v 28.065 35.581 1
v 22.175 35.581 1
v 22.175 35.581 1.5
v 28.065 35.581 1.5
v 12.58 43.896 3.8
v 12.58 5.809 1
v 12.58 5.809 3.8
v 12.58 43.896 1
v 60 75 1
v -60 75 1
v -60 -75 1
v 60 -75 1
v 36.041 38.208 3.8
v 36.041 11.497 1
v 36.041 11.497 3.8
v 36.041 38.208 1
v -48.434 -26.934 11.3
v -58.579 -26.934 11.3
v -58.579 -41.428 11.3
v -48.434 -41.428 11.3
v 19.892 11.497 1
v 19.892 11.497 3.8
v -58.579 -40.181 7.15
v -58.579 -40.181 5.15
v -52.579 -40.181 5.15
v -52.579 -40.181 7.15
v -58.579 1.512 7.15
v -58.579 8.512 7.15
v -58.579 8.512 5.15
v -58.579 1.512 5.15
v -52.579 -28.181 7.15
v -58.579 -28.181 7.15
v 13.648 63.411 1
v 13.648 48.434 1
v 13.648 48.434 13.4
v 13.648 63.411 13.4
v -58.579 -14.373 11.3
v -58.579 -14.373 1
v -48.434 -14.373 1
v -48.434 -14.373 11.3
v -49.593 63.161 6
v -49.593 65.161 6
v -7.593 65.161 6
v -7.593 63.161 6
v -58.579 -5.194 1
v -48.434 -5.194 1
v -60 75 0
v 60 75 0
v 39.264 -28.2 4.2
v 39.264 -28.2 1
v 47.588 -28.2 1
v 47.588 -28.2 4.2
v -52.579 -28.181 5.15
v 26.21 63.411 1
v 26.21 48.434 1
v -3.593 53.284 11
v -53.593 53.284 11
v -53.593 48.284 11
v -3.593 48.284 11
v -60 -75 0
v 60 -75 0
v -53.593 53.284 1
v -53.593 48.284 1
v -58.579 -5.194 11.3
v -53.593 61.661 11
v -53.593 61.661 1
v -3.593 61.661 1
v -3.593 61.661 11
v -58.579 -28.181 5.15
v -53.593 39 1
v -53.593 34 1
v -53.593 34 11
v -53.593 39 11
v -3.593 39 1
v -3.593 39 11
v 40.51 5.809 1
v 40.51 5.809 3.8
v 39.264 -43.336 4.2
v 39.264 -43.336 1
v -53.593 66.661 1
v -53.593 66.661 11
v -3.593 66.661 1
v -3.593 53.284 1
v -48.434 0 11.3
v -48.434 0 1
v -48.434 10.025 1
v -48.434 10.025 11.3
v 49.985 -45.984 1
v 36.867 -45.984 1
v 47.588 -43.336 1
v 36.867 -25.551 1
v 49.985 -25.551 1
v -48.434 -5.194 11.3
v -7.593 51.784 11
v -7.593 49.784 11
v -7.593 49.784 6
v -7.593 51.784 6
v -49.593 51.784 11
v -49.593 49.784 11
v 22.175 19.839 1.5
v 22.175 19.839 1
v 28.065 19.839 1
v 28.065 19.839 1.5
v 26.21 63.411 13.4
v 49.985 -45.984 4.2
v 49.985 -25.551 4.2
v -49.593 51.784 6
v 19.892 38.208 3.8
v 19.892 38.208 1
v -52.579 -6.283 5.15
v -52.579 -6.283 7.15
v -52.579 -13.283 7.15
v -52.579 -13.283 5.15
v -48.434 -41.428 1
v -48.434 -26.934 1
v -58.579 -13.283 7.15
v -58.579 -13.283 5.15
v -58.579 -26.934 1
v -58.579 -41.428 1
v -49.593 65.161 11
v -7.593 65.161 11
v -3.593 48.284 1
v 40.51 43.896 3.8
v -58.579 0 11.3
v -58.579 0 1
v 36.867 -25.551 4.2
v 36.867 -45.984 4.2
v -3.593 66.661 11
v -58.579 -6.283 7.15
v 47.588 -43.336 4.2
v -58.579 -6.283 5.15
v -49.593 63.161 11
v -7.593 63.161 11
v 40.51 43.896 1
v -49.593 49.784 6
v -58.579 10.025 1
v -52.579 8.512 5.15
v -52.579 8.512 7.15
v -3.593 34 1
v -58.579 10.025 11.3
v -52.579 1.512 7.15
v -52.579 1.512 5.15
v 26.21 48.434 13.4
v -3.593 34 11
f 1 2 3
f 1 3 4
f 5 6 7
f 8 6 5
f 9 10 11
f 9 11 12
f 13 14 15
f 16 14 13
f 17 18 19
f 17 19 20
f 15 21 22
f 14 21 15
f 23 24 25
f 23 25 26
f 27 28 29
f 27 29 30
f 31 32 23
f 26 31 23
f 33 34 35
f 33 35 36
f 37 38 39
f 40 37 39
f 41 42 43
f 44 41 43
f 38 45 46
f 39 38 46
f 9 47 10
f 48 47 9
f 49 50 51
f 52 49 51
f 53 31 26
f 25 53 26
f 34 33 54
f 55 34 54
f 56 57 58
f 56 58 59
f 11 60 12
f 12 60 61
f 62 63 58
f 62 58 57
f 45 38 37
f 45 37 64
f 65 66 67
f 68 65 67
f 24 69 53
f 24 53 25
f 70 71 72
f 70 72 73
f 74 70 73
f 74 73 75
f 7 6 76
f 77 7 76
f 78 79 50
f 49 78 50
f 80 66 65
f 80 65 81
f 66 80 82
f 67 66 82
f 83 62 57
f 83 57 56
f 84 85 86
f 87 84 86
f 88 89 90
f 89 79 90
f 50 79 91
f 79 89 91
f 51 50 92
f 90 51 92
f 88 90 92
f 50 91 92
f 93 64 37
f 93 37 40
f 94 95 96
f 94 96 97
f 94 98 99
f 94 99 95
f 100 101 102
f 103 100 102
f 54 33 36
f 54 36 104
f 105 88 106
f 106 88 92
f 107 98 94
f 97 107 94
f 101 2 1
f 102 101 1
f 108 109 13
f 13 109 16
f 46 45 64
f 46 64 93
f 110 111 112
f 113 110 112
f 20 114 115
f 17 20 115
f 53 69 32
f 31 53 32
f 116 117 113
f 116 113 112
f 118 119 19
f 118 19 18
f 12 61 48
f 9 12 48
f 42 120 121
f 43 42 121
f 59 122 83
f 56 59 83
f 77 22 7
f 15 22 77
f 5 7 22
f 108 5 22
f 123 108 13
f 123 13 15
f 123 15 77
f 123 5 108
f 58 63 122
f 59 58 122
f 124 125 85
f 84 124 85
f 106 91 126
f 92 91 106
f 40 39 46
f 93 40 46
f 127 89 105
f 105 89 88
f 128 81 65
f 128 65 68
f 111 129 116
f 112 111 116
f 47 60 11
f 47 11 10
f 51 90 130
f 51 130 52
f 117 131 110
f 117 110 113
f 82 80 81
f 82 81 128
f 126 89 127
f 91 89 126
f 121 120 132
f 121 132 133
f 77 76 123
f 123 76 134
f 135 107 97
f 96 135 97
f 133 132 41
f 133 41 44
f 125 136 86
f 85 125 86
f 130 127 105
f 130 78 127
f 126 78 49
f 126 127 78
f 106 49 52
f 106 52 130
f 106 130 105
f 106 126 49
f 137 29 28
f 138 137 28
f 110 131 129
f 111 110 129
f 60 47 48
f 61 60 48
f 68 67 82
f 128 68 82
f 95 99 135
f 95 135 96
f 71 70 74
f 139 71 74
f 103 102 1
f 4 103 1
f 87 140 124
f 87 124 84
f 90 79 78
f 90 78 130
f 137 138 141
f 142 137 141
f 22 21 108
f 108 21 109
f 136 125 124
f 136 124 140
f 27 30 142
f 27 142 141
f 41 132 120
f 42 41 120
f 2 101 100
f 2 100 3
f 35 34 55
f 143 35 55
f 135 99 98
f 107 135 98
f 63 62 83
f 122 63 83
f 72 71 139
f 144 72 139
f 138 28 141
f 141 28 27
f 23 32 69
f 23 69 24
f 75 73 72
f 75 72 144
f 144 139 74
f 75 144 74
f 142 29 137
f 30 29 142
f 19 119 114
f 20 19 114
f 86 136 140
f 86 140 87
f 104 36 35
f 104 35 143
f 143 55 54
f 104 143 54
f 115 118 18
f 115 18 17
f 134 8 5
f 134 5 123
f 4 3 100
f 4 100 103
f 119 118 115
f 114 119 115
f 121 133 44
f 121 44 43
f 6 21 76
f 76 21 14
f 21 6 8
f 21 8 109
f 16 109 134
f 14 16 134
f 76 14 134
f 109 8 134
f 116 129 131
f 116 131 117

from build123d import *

# Parameters (mm, degrees)
F0_W      = 120
F0_H      = 150
F1_DEPTH  = 1
F2_W      = 50
F2_H      = 5
F3_DEPTH  = 10
F4_W      = 42
F4_H      = 2
F5_DEPTH  = 5
F6_W      = 42
F6_H      = 2
F7_DEPTH  = 5
F8_W      = 42
F8_H      = 2
F9_DEPTH  = 5
F11_W     = 12.5613491982
F11_H     = 14.9769969285
F12_DEPTH = 12.4
F13_W     = 27.9304655269
F13_H     = 38.0869996734
F13_W_2   = 16.1488875747
F13_H_2   = 26.711682789
F14_DEPTH = 2.8
F15_W     = 5.8907903731
F15_H     = 15.7426279038
F16_DEPTH = 0.5
F17_W     = 10.1457051933
F17_H     = 10.0249247625
F18_DEPTH = 10.3
F17_H_2   = 9.1794477776
F17_H_3   = 14.4938677549
F19_W     = 7
F19_H     = 2
F20_DEPTH = 6
F21_W     = 7
F21_H     = 2
F22_DEPTH = 6
F23_W     = 12
F23_H     = 2
F24_DEPTH = 6
F25_W     = 13.1174921989
F25_H     = 20.4330086708
F25_W_2   = 8.3245635033
F25_H_2   = 15.13556391
F26_DEPTH = 3.2


with BuildPart() as f1:
    # F0 (on Top) → F1 (new body)
    with BuildSketch(Plane.XY):
        Rectangle(F0_W, F0_H)
    extrude(amount=F1_DEPTH)

    # F8 (on face) → F9 (cut)
    with BuildSketch(Plane.XY.offset(11)):
        with Locations((-28.592904564, 36.5001881123)):
            Rectangle(F8_W, F8_H)
    extrude(amount=F9_DEPTH, mode=Mode.SUBTRACT)


with BuildPart() as f3:
    # F2 (on face) → F3 (new body)
    with BuildSketch(Plane.XY.offset(1)):
        with Locations((-28.592904564, 64.1609585766)):
            Rectangle(F2_W, F2_H)
    extrude(amount=F3_DEPTH)


with BuildPart() as f3b:
    # F2 (on face) → F3, piece 2 (new body)
    with BuildSketch(Plane.XY.offset(1)):
        with Locations((-28.592904564, 50.7838189137)):
            Rectangle(F2_W, F2_H)
    extrude(amount=F3_DEPTH)


with BuildPart() as f3c:
    # F2 (on face) → F3, piece 3 (new body)
    with BuildSketch(Plane.XY.offset(1)):
        with Locations((-28.592904564, 36.5001881123)):
            Rectangle(F2_W, F2_H)
    extrude(amount=F3_DEPTH)


with BuildPart() as f5:
    # F4 (on face) → F5 (new body)
    with BuildSketch(Plane.XY.offset(11)):
        with Locations((-28.592904564, 64.1609585766)):
            Rectangle(F4_W, F4_H)
    extrude(amount=-F5_DEPTH)


with BuildPart() as f7:
    # F6 (on face) → F7 (new body)
    with BuildSketch(Plane.XY.offset(11)):
        with Locations((-28.592904564, 50.7838189137)):
            Rectangle(F6_W, F6_H)
    extrude(amount=-F7_DEPTH)


with BuildPart() as f12:
    # F11 (on face) → F12 (new body)
    with BuildSketch(Plane.XY.offset(1)):
        with Locations((19.9290653691, 55.9221636504)):
            Rectangle(F11_W, F11_H)
    extrude(amount=F12_DEPTH)


with BuildPart() as f14:
    # F13 (on face) → F14 (new body)
    with BuildSketch(Plane.XY.offset(1)):
        with Locations((26.5448740683, 24.852467468)):
            Rectangle(F13_W, F13_H)
        with Locations((27.9667899013, 24.8524681665)):
            Rectangle(F13_W_2, F13_H_2, mode=Mode.SUBTRACT)
    extrude(amount=F14_DEPTH)


with BuildPart() as f16:
    # F15 (on face) → F16 (new body)
    with BuildSketch(Plane.XY.offset(1)):
        with Locations((25.1199938357, 27.7099097148)):
            Rectangle(F15_W, F15_H)
    extrude(amount=F16_DEPTH)


with BuildPart() as f18:
    # F17 (on face) → F18 (new body)
    with BuildSketch(Plane.XY.offset(1)):
        with Locations((-53.5065177828, 5.0124623813)):
            Rectangle(F17_W, F17_H)
    extrude(amount=F18_DEPTH)


with BuildPart() as f18b:
    # F17 (on face) → F18, piece 2 (new body)
    with BuildSketch(Plane.XY.offset(1)):
        with Locations((-53.5065177828, -9.7833597101)):
            Rectangle(F17_W, F17_H_2)
    extrude(amount=F18_DEPTH)


with BuildPart() as f18c:
    # F17 (on face) → F18, piece 3 (new body)
    with BuildSketch(Plane.XY.offset(1)):
        with Locations((-53.5065177828, -34.1813676059)):
            Rectangle(F17_W, F17_H_3)
    extrude(amount=F18_DEPTH)


with BuildPart() as f20:
    # F19 (on face) → F20 (new body)
    with BuildSketch(Plane(origin=(-58.5793703794, 0, 0), x_dir=(0, -1, 0), z_dir=(-1, 0, 0))):
        with Locations((-5.0124623813, 6.15)):
            Rectangle(F19_W, F19_H)
    extrude(amount=-F20_DEPTH)


with BuildPart() as f22:
    # F21 (on face) → F22 (new body)
    with BuildSketch(Plane(origin=(-58.5793703794, 0, 0), x_dir=(0, -1, 0), z_dir=(-1, 0, 0))):
        with Locations((9.7833597101, 6.15)):
            Rectangle(F21_W, F21_H)
    extrude(amount=-F22_DEPTH)


with BuildPart() as f24:
    # F23 (on face) → F24 (new body)
    with BuildSketch(Plane(origin=(-58.5793703794, 0, 0), x_dir=(0, -1, 0), z_dir=(-1, 0, 0))):
        with Locations((34.1813676059, 6.15)):
            Rectangle(F23_W, F23_H)
    extrude(amount=-F24_DEPTH)


with BuildPart() as f26:
    # F25 (on face) → F26 (new body)
    with BuildSketch(Plane.XY.offset(1)):
        with Locations((43.4258058667, -35.767737776)):
            Rectangle(F25_W, F25_H)
        with Locations((43.4258058667, -35.767737776)):
            Rectangle(F25_W_2, F25_H_2, mode=Mode.SUBTRACT)
    extrude(amount=F26_DEPTH)


solid = Compound([f1.part, f3.part, f3b.part, f3c.part, f5.part, f7.part, f12.part, f14.part, f16.part, f18.part, f18b.part, f18c.part, f20.part, f22.part, f24.part, f26.part])
